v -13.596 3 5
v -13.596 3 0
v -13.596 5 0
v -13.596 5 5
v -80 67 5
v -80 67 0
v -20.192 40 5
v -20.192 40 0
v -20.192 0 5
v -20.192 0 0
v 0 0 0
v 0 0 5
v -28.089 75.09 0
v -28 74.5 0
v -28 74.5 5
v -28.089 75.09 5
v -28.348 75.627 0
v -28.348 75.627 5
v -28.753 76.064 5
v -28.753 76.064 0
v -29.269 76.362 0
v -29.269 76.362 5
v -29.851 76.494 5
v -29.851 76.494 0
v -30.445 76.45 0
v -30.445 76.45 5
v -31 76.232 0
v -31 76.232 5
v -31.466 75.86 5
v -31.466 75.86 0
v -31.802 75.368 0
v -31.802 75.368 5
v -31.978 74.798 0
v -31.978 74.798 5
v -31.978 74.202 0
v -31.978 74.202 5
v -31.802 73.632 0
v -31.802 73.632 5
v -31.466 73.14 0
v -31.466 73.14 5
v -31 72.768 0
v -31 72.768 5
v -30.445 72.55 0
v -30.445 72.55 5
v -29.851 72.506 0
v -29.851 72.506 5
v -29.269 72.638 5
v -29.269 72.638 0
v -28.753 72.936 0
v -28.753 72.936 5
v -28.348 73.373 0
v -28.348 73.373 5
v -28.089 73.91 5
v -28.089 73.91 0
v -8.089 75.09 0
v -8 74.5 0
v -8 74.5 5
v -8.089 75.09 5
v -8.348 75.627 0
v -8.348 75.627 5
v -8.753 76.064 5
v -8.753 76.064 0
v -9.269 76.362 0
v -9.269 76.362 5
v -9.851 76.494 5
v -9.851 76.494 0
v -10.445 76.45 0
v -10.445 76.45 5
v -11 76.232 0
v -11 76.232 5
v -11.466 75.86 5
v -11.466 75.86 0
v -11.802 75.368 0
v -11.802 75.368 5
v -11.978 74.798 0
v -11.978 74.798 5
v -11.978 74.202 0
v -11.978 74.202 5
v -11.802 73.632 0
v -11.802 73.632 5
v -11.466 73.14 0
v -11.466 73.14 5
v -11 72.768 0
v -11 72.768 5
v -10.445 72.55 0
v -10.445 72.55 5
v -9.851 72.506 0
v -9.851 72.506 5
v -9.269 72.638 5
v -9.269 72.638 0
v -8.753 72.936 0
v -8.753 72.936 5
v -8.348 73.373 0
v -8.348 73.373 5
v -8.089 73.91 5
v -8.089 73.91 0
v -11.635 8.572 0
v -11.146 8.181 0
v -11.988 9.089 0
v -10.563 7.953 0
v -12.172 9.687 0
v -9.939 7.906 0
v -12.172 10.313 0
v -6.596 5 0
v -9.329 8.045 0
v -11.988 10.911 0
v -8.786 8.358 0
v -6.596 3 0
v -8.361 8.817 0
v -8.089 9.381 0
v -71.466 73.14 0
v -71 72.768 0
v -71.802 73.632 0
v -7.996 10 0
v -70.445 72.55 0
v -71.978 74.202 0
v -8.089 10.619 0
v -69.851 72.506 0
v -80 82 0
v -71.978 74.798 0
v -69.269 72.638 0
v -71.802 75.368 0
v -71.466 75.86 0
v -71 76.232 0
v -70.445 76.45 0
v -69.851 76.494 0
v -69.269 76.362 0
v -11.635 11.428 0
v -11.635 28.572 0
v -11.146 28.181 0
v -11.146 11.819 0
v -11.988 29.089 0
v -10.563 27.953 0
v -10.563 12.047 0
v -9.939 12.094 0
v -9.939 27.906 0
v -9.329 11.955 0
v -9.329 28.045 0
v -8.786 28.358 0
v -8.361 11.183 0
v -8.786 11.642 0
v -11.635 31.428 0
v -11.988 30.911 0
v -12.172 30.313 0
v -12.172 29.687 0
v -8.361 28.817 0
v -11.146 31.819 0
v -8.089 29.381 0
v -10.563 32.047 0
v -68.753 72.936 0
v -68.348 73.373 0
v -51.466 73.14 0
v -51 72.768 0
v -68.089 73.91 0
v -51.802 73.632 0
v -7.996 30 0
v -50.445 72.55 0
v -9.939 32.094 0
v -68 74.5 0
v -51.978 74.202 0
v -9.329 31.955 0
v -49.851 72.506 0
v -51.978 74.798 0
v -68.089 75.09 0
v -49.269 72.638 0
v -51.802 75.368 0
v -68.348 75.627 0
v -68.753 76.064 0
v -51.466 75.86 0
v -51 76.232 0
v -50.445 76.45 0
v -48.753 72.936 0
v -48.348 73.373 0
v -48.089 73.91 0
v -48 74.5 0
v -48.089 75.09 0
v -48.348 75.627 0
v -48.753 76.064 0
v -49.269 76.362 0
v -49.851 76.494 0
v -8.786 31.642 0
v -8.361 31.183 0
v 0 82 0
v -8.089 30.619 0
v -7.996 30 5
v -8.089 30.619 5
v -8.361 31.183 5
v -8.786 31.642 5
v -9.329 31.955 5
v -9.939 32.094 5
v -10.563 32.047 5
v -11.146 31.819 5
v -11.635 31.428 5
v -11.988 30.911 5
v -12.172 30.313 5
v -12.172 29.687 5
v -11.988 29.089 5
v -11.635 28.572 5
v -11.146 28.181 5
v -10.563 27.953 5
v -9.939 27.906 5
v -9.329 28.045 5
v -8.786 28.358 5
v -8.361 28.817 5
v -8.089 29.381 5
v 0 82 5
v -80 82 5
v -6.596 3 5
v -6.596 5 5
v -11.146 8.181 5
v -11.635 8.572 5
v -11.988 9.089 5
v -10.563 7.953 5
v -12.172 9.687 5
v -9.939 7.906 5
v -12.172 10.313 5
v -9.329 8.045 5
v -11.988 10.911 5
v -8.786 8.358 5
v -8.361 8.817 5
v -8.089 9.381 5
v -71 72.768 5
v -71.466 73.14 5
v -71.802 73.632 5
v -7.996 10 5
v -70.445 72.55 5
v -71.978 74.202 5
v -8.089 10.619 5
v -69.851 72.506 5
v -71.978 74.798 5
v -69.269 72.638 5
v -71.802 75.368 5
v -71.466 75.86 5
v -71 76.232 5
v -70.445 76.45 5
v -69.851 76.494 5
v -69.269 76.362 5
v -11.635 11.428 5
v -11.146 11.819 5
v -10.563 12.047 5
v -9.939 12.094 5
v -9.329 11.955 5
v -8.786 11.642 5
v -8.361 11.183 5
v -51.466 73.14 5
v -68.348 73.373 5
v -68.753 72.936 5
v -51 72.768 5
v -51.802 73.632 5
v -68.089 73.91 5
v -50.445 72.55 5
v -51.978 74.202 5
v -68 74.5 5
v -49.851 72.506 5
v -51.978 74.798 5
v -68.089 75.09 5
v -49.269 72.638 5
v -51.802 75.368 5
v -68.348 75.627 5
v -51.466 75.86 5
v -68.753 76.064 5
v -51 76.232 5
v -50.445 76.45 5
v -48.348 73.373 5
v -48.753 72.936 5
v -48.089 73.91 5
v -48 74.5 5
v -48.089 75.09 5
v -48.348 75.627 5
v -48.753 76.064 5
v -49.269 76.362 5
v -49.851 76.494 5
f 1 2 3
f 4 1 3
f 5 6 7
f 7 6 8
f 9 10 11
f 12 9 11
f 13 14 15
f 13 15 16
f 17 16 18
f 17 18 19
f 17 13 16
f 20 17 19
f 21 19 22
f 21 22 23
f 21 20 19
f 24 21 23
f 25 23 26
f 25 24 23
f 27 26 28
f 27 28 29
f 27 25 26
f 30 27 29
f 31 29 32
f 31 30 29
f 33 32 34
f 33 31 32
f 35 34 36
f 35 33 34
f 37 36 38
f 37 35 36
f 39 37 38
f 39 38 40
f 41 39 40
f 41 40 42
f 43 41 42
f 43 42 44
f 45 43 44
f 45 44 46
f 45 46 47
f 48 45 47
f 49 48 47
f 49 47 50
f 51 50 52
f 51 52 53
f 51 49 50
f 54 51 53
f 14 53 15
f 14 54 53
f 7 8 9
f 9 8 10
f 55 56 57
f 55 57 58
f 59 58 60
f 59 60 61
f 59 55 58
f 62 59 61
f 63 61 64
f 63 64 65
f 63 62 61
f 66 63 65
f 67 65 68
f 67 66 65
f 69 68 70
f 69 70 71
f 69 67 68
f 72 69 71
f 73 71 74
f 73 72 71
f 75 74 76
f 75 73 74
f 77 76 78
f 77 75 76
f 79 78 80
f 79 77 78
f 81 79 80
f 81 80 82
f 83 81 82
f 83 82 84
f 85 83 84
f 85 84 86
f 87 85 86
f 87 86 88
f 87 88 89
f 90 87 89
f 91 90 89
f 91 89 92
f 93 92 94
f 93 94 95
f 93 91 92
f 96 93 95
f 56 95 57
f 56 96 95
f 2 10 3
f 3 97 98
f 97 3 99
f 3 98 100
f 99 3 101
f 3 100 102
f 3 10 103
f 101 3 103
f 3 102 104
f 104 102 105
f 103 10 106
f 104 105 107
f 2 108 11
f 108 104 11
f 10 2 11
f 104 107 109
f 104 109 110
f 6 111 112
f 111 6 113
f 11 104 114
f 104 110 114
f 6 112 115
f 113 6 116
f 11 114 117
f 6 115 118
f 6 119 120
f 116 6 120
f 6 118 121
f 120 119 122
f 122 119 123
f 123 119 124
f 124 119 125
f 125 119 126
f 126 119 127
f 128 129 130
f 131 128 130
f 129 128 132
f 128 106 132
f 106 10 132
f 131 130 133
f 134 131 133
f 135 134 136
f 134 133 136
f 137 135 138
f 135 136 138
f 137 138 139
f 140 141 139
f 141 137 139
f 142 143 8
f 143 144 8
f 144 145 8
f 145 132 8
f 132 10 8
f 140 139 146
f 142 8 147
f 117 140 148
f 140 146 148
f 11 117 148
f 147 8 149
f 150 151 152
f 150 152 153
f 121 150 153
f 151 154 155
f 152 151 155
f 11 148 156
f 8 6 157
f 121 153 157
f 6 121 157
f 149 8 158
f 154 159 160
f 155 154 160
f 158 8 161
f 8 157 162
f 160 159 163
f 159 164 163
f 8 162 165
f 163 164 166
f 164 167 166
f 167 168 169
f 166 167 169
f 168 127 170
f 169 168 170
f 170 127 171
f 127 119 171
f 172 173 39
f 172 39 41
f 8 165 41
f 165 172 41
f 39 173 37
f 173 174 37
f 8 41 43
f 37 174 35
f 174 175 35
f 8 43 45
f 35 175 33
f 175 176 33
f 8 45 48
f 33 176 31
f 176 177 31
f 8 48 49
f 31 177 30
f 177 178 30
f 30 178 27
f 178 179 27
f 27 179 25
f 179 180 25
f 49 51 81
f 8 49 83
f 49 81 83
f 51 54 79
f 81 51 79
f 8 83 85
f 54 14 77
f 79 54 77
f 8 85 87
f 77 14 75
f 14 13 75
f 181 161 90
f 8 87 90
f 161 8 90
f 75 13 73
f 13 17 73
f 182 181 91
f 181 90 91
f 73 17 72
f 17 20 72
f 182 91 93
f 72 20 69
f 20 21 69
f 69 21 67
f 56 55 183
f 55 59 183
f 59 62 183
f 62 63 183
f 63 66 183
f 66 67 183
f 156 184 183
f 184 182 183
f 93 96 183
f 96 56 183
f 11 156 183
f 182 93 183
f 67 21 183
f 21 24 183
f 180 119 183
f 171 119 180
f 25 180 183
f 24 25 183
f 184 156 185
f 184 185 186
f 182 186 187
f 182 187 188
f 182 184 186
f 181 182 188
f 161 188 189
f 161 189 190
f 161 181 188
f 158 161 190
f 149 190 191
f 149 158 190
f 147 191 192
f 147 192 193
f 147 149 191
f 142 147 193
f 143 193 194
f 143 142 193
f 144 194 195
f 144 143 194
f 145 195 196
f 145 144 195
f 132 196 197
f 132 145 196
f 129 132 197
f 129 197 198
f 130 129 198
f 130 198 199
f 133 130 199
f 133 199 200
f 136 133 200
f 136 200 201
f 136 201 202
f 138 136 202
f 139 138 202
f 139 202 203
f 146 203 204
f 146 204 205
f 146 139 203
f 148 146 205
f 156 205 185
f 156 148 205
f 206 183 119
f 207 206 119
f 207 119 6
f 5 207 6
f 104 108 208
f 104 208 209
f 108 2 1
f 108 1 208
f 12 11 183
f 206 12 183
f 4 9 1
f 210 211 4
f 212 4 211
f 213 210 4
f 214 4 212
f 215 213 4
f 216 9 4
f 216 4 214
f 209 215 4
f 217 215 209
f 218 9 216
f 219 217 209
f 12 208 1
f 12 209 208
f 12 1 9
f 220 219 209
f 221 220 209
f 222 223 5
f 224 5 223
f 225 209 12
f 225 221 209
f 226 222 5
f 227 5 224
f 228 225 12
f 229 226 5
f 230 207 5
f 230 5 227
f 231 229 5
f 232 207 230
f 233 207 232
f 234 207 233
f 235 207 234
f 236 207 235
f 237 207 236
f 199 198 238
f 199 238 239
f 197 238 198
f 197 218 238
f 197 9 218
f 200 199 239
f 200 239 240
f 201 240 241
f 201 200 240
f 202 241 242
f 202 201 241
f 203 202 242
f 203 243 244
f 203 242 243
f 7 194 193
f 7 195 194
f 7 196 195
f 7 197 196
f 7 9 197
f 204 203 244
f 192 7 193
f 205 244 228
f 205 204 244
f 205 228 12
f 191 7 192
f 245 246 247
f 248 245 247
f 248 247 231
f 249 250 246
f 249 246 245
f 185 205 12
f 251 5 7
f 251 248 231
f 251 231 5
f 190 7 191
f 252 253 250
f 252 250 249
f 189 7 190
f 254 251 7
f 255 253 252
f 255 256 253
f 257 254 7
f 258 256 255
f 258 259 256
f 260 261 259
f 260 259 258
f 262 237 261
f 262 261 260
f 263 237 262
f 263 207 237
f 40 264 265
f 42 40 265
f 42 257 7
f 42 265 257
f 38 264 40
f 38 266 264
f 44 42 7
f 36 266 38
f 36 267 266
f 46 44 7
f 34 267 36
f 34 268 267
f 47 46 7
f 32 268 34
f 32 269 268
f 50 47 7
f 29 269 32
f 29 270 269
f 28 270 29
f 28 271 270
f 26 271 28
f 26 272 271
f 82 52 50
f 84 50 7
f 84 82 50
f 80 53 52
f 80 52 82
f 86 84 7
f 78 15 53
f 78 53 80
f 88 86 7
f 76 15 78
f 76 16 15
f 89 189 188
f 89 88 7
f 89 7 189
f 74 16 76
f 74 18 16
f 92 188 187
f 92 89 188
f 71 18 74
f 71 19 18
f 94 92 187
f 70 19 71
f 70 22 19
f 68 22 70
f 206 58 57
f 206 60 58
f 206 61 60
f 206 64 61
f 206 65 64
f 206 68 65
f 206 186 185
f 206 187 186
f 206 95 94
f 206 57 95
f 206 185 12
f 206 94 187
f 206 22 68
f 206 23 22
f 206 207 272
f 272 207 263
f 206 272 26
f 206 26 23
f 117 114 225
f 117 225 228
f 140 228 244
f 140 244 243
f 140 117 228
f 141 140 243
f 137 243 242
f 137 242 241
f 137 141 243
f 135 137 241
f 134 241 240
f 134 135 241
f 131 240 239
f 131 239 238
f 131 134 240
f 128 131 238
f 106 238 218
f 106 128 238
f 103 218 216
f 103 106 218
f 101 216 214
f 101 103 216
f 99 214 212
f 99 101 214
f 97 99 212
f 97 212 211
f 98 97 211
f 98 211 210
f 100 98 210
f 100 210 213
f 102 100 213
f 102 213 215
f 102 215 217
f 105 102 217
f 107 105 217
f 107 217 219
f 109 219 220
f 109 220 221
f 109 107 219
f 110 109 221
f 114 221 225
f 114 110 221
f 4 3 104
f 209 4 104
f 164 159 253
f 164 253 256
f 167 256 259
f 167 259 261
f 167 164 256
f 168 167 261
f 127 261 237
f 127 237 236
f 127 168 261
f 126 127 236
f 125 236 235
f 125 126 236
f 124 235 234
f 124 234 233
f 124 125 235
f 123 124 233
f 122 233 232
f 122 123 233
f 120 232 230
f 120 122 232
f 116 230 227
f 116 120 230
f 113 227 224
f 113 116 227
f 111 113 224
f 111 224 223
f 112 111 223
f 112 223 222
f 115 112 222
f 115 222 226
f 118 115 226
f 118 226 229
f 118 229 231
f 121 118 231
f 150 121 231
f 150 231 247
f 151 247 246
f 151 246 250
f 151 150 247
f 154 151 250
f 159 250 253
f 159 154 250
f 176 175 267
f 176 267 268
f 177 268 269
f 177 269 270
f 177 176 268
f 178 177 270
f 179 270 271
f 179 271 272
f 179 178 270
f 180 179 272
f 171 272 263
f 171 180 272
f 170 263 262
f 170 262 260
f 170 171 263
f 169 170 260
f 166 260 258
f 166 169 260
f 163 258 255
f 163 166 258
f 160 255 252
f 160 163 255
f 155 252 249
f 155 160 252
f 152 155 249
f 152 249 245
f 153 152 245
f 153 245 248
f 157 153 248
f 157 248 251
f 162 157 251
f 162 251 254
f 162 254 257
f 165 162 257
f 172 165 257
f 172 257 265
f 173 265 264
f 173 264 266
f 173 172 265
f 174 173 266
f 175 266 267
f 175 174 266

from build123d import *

# Parameters (mm, degrees)
SKETCH1_R           = 2.1
SKETCH1_R_2         = 2
SKETCH1_W           = 7
SKETCH1_H           = 2
BOSS_EXTRUDE1_DEPTH = 5


with BuildPart() as part:
    # Sketch1 → Boss-Extrude1 (new body)
    with BuildSketch(Plane.XY):
        Polygon((0, 0), (0, 82), (-80, 82), (-80, 67), (-20.191582532, 40), (-20.191582532, 0), align=None)
        with Locations((-10.095791266, 10)):
            Circle(SKETCH1_R, mode=Mode.SUBTRACT)
        with Locations((-10.095791266, 30)):
            Circle(SKETCH1_R, mode=Mode.SUBTRACT)
        with Locations((-70, 74.5)):
            Circle(SKETCH1_R_2, mode=Mode.SUBTRACT)
        with Locations((-50, 74.5)):
            Circle(SKETCH1_R_2, mode=Mode.SUBTRACT)
        with Locations((-30, 74.5)):
            Circle(SKETCH1_R_2, mode=Mode.SUBTRACT)
        with Locations((-10, 74.5)):
            Circle(SKETCH1_R_2, mode=Mode.SUBTRACT)
        with Locations((-10.095791266, 4)):
            Rectangle(SKETCH1_W, SKETCH1_H, mode=Mode.SUBTRACT)
    extrude(amount=BOSS_EXTRUDE1_DEPTH)


solid = part.part
